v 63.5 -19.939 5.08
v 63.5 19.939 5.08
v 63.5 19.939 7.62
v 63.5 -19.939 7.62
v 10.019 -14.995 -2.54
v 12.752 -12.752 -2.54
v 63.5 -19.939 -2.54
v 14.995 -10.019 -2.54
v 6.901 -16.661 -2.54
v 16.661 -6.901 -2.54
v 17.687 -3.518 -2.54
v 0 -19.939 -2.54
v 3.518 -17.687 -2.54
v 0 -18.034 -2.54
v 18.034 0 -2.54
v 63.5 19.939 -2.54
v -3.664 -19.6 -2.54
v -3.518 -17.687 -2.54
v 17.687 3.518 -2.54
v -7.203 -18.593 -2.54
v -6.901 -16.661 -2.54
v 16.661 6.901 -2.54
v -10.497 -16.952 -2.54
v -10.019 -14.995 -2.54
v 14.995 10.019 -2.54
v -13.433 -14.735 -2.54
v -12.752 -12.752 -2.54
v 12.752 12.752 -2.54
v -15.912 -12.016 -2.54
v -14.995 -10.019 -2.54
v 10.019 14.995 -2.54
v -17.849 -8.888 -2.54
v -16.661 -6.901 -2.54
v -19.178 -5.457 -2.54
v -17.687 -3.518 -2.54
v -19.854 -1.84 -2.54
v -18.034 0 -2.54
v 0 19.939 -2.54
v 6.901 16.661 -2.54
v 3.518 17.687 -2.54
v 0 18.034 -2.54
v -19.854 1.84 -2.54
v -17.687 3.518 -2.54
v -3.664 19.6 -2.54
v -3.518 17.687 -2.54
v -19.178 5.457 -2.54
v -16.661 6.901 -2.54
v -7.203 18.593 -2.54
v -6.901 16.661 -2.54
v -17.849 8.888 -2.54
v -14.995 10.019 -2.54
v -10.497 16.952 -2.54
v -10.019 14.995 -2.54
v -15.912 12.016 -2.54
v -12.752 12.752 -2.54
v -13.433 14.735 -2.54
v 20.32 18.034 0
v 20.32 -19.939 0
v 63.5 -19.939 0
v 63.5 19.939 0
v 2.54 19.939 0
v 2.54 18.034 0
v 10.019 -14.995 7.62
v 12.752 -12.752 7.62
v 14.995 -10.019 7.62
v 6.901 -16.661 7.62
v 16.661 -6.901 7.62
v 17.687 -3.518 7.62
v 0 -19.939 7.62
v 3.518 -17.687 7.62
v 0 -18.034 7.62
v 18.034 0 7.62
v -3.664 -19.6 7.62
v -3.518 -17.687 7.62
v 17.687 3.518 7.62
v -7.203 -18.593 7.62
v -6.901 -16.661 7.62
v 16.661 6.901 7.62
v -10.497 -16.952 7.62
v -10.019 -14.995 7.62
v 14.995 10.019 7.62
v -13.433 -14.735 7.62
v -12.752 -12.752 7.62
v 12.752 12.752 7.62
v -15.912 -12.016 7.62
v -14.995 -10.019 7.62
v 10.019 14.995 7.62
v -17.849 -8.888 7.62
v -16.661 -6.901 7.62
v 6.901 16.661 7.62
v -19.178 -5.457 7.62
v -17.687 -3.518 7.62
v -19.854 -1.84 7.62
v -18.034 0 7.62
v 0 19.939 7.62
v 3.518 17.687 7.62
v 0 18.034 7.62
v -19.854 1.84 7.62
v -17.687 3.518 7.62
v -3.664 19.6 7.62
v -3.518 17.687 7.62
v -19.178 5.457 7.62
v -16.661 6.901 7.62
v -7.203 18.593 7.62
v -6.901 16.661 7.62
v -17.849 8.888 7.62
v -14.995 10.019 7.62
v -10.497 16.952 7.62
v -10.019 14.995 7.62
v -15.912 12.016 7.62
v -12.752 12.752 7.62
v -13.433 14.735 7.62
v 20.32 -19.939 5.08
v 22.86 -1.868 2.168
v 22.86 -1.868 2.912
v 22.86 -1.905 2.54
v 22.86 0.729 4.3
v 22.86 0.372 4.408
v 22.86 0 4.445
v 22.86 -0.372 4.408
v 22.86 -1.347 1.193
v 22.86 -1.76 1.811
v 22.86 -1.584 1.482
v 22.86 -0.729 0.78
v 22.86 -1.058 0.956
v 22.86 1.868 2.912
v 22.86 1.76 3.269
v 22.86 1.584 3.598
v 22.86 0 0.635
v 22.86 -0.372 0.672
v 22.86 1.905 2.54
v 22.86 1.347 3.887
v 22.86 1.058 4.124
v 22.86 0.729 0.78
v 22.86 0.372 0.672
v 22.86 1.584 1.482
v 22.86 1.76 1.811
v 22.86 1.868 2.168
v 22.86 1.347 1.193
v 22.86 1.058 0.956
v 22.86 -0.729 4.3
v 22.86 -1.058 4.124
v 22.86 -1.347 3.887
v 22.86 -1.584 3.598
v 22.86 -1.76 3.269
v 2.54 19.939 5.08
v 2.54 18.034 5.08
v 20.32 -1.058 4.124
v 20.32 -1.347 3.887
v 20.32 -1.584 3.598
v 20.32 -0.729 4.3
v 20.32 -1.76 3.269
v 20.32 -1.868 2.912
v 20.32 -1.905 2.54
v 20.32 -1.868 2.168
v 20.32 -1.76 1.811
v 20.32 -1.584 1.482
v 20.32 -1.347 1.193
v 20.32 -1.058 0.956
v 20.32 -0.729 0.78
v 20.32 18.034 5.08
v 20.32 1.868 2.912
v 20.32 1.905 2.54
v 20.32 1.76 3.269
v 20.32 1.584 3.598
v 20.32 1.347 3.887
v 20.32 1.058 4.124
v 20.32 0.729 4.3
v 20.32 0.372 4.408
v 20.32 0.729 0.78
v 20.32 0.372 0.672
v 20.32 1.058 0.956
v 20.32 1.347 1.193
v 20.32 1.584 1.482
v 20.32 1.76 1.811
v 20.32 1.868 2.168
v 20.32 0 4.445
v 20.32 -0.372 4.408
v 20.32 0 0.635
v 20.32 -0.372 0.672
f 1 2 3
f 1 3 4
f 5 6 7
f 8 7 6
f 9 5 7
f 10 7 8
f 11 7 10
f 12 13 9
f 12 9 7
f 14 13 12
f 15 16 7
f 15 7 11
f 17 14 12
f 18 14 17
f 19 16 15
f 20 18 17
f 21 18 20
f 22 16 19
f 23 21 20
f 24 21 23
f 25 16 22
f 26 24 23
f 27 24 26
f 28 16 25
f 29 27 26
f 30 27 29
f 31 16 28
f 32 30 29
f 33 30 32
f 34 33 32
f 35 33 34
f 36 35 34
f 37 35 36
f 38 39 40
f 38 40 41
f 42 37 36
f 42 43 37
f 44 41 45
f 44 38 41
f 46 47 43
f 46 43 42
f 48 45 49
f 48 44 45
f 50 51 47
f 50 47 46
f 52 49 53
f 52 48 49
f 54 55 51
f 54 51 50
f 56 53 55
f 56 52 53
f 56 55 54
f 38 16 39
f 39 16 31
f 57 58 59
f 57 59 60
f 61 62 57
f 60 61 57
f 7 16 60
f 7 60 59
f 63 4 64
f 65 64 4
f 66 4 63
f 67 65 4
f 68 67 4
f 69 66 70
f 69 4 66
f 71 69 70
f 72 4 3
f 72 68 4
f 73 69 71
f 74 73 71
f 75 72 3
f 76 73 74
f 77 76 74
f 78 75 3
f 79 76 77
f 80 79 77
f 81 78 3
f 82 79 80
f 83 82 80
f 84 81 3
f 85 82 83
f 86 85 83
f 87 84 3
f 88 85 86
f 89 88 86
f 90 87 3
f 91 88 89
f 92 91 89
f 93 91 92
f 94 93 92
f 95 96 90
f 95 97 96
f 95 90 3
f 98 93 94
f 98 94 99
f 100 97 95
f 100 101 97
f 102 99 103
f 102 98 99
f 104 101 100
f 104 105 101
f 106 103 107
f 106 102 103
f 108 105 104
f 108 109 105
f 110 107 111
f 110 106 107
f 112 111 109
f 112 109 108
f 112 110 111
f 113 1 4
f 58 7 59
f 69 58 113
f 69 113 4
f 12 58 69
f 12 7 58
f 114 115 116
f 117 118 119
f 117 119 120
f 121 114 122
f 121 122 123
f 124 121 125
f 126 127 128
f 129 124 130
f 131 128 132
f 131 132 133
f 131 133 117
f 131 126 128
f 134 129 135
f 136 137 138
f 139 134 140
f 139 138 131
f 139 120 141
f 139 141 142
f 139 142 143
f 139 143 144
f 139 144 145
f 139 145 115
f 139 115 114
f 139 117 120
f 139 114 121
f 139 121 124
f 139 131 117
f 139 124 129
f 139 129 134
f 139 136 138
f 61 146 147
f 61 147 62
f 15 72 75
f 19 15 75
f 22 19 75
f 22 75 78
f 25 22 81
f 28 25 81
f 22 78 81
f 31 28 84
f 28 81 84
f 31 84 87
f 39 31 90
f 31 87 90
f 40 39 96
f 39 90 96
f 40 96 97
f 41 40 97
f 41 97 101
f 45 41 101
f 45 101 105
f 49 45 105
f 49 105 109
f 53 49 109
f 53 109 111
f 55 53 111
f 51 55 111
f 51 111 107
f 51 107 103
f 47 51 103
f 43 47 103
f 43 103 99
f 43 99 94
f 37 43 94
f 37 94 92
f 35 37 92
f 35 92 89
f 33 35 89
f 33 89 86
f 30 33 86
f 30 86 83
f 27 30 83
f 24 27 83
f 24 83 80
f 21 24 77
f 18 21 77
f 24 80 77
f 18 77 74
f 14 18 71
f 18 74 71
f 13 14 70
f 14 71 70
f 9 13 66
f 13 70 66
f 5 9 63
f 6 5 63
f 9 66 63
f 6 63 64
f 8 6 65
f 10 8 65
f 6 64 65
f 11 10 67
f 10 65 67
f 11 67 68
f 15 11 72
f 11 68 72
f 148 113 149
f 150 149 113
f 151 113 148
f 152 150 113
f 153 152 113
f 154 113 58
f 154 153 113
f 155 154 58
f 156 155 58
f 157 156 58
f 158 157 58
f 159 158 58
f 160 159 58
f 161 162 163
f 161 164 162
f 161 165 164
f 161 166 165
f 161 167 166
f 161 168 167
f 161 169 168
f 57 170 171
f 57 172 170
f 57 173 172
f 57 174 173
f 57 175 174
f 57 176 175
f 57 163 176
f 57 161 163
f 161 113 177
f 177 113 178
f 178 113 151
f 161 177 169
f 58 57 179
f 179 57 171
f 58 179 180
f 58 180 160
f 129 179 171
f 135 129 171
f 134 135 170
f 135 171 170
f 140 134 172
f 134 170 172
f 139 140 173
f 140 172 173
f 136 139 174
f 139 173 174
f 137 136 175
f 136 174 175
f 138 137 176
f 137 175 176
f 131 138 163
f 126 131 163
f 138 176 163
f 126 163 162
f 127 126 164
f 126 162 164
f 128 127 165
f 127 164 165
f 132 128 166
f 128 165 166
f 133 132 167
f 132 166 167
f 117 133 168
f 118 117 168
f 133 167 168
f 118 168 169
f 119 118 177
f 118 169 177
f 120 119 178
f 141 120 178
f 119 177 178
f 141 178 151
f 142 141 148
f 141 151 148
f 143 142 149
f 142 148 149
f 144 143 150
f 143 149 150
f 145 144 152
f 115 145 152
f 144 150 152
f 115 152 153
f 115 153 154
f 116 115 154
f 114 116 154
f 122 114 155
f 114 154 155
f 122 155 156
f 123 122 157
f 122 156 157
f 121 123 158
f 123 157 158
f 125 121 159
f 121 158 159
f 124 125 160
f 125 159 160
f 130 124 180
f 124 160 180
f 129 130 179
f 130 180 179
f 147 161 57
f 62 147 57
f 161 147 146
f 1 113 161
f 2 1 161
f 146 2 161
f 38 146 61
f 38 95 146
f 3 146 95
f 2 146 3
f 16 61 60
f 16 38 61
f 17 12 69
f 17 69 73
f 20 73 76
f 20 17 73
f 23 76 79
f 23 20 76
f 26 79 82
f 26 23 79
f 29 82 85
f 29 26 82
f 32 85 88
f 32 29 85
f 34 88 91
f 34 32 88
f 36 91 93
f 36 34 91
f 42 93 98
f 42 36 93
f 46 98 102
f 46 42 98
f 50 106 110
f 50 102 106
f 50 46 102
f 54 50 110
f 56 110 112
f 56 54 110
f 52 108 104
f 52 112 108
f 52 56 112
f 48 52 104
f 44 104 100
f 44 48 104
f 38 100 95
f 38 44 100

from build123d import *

# Parameters (mm, degrees)
SKETCH1_R                = 19.939
CIRCLE_EXTRUDE_DEPTH     = 7.62
SKETCH3_W                = 7.62
SKETCH3_H                = 39.878
RECTANGLE_EXTRUDE_DEPTH  = 63.5
SKETCH2_R                = 18.034
CRICLE_CUT_DEPTH         = 67.991627245
EXTENSION_START          = 2.54
EXTENSION_DEPTH          = 2.54
SKETCH15_R               = 18.034
CIRCLE_CUT_2_DEPTH       = 67.991627245
SKETCH16_W               = 5.08
SKETCH16_H               = 39.878
MIDDLE_CUT_DEPTH         = 49.167836997
SKETCH18_W               = 5.08
SKETCH18_H               = 1.905
CUT_EXTRUDE5_DEPTH       = 17.78
SKETCH19_R               = 1.905
FOR_SPRING_EXTRUDE_DEPTH = 2.54


with BuildPart() as part:
    # Sketch1 → circle extrude (new body)
    with BuildSketch(Plane.XY):
        with Locations(Location((0, 0, 0), (0, 0, 180))):
            Circle(SKETCH1_R)
    extrude(amount=CIRCLE_EXTRUDE_DEPTH)

    # Sketch3 → rectangle extrude (add)
    with BuildSketch(Plane(origin=(0, 0, 0), x_dir=(0, 0, -1), z_dir=(1, 0, 0))):
        with Locations((-3.81, 0)):
            Rectangle(SKETCH3_W, SKETCH3_H)
    extrude(amount=RECTANGLE_EXTRUDE_DEPTH)

    # Sketch2 → cricle cut (cut, through all)
    with BuildSketch(Plane.XY.offset(7.62)):
        Circle(SKETCH2_R)
    extrude(amount=-CRICLE_CUT_DEPTH, mode=Mode.SUBTRACT)

    # Sketch10 → extension (add)
    with BuildSketch(Plane(origin=(0, 0, 0), x_dir=(-1, 0, 0), z_dir=(0, 0, -1)).offset(EXTENSION_START)):
        with BuildLine():
            Line((0, 19.939), (-63.5, 19.939))
            Line((-63.5, 19.939), (-63.5, -19.939))
            Line((-63.5, -19.939), (0, -19.939))
            ThreePointArc((0, -19.939), (19.939, 0), (0, 19.939))
        make_face()
    extrude(amount=-EXTENSION_DEPTH)

    # Sketch15 → circle cut 2 (cut, through all)
    with BuildSketch(Plane.XY):
        Circle(SKETCH15_R)
    extrude(amount=-CIRCLE_CUT_2_DEPTH, mode=Mode.SUBTRACT)

    # Sketch16 → middle cut (cut, through all)
    with BuildSketch(Plane(origin=(20.32, 0, 0), x_dir=(0, 0, -1), z_dir=(1, 0, 0))):
        with Locations((-2.54, 0)):
            Rectangle(SKETCH16_W, SKETCH16_H)
    extrude(amount=MIDDLE_CUT_DEPTH, mode=Mode.SUBTRACT)

    # Sketch18 → Cut-Extrude5 (cut)
    with BuildSketch(Plane(origin=(20.32, 0, 0), x_dir=(0, 0, -1), z_dir=(1, 0, 0))):
        with Locations((-2.54, 18.9865)):
            Rectangle(SKETCH18_W, SKETCH18_H)
    extrude(amount=-CUT_EXTRUDE5_DEPTH, mode=Mode.SUBTRACT)

    # Sketch19 → for spring extrude (add)
    with BuildSketch(Plane(origin=(20.32, 0, 0), x_dir=(0, 0, -1), z_dir=(1, 0, 0))):
        with Locations((-2.54, 0)):
            Circle(SKETCH19_R)
    extrude(amount=FOR_SPRING_EXTRUDE_DEPTH)


solid = part.part
